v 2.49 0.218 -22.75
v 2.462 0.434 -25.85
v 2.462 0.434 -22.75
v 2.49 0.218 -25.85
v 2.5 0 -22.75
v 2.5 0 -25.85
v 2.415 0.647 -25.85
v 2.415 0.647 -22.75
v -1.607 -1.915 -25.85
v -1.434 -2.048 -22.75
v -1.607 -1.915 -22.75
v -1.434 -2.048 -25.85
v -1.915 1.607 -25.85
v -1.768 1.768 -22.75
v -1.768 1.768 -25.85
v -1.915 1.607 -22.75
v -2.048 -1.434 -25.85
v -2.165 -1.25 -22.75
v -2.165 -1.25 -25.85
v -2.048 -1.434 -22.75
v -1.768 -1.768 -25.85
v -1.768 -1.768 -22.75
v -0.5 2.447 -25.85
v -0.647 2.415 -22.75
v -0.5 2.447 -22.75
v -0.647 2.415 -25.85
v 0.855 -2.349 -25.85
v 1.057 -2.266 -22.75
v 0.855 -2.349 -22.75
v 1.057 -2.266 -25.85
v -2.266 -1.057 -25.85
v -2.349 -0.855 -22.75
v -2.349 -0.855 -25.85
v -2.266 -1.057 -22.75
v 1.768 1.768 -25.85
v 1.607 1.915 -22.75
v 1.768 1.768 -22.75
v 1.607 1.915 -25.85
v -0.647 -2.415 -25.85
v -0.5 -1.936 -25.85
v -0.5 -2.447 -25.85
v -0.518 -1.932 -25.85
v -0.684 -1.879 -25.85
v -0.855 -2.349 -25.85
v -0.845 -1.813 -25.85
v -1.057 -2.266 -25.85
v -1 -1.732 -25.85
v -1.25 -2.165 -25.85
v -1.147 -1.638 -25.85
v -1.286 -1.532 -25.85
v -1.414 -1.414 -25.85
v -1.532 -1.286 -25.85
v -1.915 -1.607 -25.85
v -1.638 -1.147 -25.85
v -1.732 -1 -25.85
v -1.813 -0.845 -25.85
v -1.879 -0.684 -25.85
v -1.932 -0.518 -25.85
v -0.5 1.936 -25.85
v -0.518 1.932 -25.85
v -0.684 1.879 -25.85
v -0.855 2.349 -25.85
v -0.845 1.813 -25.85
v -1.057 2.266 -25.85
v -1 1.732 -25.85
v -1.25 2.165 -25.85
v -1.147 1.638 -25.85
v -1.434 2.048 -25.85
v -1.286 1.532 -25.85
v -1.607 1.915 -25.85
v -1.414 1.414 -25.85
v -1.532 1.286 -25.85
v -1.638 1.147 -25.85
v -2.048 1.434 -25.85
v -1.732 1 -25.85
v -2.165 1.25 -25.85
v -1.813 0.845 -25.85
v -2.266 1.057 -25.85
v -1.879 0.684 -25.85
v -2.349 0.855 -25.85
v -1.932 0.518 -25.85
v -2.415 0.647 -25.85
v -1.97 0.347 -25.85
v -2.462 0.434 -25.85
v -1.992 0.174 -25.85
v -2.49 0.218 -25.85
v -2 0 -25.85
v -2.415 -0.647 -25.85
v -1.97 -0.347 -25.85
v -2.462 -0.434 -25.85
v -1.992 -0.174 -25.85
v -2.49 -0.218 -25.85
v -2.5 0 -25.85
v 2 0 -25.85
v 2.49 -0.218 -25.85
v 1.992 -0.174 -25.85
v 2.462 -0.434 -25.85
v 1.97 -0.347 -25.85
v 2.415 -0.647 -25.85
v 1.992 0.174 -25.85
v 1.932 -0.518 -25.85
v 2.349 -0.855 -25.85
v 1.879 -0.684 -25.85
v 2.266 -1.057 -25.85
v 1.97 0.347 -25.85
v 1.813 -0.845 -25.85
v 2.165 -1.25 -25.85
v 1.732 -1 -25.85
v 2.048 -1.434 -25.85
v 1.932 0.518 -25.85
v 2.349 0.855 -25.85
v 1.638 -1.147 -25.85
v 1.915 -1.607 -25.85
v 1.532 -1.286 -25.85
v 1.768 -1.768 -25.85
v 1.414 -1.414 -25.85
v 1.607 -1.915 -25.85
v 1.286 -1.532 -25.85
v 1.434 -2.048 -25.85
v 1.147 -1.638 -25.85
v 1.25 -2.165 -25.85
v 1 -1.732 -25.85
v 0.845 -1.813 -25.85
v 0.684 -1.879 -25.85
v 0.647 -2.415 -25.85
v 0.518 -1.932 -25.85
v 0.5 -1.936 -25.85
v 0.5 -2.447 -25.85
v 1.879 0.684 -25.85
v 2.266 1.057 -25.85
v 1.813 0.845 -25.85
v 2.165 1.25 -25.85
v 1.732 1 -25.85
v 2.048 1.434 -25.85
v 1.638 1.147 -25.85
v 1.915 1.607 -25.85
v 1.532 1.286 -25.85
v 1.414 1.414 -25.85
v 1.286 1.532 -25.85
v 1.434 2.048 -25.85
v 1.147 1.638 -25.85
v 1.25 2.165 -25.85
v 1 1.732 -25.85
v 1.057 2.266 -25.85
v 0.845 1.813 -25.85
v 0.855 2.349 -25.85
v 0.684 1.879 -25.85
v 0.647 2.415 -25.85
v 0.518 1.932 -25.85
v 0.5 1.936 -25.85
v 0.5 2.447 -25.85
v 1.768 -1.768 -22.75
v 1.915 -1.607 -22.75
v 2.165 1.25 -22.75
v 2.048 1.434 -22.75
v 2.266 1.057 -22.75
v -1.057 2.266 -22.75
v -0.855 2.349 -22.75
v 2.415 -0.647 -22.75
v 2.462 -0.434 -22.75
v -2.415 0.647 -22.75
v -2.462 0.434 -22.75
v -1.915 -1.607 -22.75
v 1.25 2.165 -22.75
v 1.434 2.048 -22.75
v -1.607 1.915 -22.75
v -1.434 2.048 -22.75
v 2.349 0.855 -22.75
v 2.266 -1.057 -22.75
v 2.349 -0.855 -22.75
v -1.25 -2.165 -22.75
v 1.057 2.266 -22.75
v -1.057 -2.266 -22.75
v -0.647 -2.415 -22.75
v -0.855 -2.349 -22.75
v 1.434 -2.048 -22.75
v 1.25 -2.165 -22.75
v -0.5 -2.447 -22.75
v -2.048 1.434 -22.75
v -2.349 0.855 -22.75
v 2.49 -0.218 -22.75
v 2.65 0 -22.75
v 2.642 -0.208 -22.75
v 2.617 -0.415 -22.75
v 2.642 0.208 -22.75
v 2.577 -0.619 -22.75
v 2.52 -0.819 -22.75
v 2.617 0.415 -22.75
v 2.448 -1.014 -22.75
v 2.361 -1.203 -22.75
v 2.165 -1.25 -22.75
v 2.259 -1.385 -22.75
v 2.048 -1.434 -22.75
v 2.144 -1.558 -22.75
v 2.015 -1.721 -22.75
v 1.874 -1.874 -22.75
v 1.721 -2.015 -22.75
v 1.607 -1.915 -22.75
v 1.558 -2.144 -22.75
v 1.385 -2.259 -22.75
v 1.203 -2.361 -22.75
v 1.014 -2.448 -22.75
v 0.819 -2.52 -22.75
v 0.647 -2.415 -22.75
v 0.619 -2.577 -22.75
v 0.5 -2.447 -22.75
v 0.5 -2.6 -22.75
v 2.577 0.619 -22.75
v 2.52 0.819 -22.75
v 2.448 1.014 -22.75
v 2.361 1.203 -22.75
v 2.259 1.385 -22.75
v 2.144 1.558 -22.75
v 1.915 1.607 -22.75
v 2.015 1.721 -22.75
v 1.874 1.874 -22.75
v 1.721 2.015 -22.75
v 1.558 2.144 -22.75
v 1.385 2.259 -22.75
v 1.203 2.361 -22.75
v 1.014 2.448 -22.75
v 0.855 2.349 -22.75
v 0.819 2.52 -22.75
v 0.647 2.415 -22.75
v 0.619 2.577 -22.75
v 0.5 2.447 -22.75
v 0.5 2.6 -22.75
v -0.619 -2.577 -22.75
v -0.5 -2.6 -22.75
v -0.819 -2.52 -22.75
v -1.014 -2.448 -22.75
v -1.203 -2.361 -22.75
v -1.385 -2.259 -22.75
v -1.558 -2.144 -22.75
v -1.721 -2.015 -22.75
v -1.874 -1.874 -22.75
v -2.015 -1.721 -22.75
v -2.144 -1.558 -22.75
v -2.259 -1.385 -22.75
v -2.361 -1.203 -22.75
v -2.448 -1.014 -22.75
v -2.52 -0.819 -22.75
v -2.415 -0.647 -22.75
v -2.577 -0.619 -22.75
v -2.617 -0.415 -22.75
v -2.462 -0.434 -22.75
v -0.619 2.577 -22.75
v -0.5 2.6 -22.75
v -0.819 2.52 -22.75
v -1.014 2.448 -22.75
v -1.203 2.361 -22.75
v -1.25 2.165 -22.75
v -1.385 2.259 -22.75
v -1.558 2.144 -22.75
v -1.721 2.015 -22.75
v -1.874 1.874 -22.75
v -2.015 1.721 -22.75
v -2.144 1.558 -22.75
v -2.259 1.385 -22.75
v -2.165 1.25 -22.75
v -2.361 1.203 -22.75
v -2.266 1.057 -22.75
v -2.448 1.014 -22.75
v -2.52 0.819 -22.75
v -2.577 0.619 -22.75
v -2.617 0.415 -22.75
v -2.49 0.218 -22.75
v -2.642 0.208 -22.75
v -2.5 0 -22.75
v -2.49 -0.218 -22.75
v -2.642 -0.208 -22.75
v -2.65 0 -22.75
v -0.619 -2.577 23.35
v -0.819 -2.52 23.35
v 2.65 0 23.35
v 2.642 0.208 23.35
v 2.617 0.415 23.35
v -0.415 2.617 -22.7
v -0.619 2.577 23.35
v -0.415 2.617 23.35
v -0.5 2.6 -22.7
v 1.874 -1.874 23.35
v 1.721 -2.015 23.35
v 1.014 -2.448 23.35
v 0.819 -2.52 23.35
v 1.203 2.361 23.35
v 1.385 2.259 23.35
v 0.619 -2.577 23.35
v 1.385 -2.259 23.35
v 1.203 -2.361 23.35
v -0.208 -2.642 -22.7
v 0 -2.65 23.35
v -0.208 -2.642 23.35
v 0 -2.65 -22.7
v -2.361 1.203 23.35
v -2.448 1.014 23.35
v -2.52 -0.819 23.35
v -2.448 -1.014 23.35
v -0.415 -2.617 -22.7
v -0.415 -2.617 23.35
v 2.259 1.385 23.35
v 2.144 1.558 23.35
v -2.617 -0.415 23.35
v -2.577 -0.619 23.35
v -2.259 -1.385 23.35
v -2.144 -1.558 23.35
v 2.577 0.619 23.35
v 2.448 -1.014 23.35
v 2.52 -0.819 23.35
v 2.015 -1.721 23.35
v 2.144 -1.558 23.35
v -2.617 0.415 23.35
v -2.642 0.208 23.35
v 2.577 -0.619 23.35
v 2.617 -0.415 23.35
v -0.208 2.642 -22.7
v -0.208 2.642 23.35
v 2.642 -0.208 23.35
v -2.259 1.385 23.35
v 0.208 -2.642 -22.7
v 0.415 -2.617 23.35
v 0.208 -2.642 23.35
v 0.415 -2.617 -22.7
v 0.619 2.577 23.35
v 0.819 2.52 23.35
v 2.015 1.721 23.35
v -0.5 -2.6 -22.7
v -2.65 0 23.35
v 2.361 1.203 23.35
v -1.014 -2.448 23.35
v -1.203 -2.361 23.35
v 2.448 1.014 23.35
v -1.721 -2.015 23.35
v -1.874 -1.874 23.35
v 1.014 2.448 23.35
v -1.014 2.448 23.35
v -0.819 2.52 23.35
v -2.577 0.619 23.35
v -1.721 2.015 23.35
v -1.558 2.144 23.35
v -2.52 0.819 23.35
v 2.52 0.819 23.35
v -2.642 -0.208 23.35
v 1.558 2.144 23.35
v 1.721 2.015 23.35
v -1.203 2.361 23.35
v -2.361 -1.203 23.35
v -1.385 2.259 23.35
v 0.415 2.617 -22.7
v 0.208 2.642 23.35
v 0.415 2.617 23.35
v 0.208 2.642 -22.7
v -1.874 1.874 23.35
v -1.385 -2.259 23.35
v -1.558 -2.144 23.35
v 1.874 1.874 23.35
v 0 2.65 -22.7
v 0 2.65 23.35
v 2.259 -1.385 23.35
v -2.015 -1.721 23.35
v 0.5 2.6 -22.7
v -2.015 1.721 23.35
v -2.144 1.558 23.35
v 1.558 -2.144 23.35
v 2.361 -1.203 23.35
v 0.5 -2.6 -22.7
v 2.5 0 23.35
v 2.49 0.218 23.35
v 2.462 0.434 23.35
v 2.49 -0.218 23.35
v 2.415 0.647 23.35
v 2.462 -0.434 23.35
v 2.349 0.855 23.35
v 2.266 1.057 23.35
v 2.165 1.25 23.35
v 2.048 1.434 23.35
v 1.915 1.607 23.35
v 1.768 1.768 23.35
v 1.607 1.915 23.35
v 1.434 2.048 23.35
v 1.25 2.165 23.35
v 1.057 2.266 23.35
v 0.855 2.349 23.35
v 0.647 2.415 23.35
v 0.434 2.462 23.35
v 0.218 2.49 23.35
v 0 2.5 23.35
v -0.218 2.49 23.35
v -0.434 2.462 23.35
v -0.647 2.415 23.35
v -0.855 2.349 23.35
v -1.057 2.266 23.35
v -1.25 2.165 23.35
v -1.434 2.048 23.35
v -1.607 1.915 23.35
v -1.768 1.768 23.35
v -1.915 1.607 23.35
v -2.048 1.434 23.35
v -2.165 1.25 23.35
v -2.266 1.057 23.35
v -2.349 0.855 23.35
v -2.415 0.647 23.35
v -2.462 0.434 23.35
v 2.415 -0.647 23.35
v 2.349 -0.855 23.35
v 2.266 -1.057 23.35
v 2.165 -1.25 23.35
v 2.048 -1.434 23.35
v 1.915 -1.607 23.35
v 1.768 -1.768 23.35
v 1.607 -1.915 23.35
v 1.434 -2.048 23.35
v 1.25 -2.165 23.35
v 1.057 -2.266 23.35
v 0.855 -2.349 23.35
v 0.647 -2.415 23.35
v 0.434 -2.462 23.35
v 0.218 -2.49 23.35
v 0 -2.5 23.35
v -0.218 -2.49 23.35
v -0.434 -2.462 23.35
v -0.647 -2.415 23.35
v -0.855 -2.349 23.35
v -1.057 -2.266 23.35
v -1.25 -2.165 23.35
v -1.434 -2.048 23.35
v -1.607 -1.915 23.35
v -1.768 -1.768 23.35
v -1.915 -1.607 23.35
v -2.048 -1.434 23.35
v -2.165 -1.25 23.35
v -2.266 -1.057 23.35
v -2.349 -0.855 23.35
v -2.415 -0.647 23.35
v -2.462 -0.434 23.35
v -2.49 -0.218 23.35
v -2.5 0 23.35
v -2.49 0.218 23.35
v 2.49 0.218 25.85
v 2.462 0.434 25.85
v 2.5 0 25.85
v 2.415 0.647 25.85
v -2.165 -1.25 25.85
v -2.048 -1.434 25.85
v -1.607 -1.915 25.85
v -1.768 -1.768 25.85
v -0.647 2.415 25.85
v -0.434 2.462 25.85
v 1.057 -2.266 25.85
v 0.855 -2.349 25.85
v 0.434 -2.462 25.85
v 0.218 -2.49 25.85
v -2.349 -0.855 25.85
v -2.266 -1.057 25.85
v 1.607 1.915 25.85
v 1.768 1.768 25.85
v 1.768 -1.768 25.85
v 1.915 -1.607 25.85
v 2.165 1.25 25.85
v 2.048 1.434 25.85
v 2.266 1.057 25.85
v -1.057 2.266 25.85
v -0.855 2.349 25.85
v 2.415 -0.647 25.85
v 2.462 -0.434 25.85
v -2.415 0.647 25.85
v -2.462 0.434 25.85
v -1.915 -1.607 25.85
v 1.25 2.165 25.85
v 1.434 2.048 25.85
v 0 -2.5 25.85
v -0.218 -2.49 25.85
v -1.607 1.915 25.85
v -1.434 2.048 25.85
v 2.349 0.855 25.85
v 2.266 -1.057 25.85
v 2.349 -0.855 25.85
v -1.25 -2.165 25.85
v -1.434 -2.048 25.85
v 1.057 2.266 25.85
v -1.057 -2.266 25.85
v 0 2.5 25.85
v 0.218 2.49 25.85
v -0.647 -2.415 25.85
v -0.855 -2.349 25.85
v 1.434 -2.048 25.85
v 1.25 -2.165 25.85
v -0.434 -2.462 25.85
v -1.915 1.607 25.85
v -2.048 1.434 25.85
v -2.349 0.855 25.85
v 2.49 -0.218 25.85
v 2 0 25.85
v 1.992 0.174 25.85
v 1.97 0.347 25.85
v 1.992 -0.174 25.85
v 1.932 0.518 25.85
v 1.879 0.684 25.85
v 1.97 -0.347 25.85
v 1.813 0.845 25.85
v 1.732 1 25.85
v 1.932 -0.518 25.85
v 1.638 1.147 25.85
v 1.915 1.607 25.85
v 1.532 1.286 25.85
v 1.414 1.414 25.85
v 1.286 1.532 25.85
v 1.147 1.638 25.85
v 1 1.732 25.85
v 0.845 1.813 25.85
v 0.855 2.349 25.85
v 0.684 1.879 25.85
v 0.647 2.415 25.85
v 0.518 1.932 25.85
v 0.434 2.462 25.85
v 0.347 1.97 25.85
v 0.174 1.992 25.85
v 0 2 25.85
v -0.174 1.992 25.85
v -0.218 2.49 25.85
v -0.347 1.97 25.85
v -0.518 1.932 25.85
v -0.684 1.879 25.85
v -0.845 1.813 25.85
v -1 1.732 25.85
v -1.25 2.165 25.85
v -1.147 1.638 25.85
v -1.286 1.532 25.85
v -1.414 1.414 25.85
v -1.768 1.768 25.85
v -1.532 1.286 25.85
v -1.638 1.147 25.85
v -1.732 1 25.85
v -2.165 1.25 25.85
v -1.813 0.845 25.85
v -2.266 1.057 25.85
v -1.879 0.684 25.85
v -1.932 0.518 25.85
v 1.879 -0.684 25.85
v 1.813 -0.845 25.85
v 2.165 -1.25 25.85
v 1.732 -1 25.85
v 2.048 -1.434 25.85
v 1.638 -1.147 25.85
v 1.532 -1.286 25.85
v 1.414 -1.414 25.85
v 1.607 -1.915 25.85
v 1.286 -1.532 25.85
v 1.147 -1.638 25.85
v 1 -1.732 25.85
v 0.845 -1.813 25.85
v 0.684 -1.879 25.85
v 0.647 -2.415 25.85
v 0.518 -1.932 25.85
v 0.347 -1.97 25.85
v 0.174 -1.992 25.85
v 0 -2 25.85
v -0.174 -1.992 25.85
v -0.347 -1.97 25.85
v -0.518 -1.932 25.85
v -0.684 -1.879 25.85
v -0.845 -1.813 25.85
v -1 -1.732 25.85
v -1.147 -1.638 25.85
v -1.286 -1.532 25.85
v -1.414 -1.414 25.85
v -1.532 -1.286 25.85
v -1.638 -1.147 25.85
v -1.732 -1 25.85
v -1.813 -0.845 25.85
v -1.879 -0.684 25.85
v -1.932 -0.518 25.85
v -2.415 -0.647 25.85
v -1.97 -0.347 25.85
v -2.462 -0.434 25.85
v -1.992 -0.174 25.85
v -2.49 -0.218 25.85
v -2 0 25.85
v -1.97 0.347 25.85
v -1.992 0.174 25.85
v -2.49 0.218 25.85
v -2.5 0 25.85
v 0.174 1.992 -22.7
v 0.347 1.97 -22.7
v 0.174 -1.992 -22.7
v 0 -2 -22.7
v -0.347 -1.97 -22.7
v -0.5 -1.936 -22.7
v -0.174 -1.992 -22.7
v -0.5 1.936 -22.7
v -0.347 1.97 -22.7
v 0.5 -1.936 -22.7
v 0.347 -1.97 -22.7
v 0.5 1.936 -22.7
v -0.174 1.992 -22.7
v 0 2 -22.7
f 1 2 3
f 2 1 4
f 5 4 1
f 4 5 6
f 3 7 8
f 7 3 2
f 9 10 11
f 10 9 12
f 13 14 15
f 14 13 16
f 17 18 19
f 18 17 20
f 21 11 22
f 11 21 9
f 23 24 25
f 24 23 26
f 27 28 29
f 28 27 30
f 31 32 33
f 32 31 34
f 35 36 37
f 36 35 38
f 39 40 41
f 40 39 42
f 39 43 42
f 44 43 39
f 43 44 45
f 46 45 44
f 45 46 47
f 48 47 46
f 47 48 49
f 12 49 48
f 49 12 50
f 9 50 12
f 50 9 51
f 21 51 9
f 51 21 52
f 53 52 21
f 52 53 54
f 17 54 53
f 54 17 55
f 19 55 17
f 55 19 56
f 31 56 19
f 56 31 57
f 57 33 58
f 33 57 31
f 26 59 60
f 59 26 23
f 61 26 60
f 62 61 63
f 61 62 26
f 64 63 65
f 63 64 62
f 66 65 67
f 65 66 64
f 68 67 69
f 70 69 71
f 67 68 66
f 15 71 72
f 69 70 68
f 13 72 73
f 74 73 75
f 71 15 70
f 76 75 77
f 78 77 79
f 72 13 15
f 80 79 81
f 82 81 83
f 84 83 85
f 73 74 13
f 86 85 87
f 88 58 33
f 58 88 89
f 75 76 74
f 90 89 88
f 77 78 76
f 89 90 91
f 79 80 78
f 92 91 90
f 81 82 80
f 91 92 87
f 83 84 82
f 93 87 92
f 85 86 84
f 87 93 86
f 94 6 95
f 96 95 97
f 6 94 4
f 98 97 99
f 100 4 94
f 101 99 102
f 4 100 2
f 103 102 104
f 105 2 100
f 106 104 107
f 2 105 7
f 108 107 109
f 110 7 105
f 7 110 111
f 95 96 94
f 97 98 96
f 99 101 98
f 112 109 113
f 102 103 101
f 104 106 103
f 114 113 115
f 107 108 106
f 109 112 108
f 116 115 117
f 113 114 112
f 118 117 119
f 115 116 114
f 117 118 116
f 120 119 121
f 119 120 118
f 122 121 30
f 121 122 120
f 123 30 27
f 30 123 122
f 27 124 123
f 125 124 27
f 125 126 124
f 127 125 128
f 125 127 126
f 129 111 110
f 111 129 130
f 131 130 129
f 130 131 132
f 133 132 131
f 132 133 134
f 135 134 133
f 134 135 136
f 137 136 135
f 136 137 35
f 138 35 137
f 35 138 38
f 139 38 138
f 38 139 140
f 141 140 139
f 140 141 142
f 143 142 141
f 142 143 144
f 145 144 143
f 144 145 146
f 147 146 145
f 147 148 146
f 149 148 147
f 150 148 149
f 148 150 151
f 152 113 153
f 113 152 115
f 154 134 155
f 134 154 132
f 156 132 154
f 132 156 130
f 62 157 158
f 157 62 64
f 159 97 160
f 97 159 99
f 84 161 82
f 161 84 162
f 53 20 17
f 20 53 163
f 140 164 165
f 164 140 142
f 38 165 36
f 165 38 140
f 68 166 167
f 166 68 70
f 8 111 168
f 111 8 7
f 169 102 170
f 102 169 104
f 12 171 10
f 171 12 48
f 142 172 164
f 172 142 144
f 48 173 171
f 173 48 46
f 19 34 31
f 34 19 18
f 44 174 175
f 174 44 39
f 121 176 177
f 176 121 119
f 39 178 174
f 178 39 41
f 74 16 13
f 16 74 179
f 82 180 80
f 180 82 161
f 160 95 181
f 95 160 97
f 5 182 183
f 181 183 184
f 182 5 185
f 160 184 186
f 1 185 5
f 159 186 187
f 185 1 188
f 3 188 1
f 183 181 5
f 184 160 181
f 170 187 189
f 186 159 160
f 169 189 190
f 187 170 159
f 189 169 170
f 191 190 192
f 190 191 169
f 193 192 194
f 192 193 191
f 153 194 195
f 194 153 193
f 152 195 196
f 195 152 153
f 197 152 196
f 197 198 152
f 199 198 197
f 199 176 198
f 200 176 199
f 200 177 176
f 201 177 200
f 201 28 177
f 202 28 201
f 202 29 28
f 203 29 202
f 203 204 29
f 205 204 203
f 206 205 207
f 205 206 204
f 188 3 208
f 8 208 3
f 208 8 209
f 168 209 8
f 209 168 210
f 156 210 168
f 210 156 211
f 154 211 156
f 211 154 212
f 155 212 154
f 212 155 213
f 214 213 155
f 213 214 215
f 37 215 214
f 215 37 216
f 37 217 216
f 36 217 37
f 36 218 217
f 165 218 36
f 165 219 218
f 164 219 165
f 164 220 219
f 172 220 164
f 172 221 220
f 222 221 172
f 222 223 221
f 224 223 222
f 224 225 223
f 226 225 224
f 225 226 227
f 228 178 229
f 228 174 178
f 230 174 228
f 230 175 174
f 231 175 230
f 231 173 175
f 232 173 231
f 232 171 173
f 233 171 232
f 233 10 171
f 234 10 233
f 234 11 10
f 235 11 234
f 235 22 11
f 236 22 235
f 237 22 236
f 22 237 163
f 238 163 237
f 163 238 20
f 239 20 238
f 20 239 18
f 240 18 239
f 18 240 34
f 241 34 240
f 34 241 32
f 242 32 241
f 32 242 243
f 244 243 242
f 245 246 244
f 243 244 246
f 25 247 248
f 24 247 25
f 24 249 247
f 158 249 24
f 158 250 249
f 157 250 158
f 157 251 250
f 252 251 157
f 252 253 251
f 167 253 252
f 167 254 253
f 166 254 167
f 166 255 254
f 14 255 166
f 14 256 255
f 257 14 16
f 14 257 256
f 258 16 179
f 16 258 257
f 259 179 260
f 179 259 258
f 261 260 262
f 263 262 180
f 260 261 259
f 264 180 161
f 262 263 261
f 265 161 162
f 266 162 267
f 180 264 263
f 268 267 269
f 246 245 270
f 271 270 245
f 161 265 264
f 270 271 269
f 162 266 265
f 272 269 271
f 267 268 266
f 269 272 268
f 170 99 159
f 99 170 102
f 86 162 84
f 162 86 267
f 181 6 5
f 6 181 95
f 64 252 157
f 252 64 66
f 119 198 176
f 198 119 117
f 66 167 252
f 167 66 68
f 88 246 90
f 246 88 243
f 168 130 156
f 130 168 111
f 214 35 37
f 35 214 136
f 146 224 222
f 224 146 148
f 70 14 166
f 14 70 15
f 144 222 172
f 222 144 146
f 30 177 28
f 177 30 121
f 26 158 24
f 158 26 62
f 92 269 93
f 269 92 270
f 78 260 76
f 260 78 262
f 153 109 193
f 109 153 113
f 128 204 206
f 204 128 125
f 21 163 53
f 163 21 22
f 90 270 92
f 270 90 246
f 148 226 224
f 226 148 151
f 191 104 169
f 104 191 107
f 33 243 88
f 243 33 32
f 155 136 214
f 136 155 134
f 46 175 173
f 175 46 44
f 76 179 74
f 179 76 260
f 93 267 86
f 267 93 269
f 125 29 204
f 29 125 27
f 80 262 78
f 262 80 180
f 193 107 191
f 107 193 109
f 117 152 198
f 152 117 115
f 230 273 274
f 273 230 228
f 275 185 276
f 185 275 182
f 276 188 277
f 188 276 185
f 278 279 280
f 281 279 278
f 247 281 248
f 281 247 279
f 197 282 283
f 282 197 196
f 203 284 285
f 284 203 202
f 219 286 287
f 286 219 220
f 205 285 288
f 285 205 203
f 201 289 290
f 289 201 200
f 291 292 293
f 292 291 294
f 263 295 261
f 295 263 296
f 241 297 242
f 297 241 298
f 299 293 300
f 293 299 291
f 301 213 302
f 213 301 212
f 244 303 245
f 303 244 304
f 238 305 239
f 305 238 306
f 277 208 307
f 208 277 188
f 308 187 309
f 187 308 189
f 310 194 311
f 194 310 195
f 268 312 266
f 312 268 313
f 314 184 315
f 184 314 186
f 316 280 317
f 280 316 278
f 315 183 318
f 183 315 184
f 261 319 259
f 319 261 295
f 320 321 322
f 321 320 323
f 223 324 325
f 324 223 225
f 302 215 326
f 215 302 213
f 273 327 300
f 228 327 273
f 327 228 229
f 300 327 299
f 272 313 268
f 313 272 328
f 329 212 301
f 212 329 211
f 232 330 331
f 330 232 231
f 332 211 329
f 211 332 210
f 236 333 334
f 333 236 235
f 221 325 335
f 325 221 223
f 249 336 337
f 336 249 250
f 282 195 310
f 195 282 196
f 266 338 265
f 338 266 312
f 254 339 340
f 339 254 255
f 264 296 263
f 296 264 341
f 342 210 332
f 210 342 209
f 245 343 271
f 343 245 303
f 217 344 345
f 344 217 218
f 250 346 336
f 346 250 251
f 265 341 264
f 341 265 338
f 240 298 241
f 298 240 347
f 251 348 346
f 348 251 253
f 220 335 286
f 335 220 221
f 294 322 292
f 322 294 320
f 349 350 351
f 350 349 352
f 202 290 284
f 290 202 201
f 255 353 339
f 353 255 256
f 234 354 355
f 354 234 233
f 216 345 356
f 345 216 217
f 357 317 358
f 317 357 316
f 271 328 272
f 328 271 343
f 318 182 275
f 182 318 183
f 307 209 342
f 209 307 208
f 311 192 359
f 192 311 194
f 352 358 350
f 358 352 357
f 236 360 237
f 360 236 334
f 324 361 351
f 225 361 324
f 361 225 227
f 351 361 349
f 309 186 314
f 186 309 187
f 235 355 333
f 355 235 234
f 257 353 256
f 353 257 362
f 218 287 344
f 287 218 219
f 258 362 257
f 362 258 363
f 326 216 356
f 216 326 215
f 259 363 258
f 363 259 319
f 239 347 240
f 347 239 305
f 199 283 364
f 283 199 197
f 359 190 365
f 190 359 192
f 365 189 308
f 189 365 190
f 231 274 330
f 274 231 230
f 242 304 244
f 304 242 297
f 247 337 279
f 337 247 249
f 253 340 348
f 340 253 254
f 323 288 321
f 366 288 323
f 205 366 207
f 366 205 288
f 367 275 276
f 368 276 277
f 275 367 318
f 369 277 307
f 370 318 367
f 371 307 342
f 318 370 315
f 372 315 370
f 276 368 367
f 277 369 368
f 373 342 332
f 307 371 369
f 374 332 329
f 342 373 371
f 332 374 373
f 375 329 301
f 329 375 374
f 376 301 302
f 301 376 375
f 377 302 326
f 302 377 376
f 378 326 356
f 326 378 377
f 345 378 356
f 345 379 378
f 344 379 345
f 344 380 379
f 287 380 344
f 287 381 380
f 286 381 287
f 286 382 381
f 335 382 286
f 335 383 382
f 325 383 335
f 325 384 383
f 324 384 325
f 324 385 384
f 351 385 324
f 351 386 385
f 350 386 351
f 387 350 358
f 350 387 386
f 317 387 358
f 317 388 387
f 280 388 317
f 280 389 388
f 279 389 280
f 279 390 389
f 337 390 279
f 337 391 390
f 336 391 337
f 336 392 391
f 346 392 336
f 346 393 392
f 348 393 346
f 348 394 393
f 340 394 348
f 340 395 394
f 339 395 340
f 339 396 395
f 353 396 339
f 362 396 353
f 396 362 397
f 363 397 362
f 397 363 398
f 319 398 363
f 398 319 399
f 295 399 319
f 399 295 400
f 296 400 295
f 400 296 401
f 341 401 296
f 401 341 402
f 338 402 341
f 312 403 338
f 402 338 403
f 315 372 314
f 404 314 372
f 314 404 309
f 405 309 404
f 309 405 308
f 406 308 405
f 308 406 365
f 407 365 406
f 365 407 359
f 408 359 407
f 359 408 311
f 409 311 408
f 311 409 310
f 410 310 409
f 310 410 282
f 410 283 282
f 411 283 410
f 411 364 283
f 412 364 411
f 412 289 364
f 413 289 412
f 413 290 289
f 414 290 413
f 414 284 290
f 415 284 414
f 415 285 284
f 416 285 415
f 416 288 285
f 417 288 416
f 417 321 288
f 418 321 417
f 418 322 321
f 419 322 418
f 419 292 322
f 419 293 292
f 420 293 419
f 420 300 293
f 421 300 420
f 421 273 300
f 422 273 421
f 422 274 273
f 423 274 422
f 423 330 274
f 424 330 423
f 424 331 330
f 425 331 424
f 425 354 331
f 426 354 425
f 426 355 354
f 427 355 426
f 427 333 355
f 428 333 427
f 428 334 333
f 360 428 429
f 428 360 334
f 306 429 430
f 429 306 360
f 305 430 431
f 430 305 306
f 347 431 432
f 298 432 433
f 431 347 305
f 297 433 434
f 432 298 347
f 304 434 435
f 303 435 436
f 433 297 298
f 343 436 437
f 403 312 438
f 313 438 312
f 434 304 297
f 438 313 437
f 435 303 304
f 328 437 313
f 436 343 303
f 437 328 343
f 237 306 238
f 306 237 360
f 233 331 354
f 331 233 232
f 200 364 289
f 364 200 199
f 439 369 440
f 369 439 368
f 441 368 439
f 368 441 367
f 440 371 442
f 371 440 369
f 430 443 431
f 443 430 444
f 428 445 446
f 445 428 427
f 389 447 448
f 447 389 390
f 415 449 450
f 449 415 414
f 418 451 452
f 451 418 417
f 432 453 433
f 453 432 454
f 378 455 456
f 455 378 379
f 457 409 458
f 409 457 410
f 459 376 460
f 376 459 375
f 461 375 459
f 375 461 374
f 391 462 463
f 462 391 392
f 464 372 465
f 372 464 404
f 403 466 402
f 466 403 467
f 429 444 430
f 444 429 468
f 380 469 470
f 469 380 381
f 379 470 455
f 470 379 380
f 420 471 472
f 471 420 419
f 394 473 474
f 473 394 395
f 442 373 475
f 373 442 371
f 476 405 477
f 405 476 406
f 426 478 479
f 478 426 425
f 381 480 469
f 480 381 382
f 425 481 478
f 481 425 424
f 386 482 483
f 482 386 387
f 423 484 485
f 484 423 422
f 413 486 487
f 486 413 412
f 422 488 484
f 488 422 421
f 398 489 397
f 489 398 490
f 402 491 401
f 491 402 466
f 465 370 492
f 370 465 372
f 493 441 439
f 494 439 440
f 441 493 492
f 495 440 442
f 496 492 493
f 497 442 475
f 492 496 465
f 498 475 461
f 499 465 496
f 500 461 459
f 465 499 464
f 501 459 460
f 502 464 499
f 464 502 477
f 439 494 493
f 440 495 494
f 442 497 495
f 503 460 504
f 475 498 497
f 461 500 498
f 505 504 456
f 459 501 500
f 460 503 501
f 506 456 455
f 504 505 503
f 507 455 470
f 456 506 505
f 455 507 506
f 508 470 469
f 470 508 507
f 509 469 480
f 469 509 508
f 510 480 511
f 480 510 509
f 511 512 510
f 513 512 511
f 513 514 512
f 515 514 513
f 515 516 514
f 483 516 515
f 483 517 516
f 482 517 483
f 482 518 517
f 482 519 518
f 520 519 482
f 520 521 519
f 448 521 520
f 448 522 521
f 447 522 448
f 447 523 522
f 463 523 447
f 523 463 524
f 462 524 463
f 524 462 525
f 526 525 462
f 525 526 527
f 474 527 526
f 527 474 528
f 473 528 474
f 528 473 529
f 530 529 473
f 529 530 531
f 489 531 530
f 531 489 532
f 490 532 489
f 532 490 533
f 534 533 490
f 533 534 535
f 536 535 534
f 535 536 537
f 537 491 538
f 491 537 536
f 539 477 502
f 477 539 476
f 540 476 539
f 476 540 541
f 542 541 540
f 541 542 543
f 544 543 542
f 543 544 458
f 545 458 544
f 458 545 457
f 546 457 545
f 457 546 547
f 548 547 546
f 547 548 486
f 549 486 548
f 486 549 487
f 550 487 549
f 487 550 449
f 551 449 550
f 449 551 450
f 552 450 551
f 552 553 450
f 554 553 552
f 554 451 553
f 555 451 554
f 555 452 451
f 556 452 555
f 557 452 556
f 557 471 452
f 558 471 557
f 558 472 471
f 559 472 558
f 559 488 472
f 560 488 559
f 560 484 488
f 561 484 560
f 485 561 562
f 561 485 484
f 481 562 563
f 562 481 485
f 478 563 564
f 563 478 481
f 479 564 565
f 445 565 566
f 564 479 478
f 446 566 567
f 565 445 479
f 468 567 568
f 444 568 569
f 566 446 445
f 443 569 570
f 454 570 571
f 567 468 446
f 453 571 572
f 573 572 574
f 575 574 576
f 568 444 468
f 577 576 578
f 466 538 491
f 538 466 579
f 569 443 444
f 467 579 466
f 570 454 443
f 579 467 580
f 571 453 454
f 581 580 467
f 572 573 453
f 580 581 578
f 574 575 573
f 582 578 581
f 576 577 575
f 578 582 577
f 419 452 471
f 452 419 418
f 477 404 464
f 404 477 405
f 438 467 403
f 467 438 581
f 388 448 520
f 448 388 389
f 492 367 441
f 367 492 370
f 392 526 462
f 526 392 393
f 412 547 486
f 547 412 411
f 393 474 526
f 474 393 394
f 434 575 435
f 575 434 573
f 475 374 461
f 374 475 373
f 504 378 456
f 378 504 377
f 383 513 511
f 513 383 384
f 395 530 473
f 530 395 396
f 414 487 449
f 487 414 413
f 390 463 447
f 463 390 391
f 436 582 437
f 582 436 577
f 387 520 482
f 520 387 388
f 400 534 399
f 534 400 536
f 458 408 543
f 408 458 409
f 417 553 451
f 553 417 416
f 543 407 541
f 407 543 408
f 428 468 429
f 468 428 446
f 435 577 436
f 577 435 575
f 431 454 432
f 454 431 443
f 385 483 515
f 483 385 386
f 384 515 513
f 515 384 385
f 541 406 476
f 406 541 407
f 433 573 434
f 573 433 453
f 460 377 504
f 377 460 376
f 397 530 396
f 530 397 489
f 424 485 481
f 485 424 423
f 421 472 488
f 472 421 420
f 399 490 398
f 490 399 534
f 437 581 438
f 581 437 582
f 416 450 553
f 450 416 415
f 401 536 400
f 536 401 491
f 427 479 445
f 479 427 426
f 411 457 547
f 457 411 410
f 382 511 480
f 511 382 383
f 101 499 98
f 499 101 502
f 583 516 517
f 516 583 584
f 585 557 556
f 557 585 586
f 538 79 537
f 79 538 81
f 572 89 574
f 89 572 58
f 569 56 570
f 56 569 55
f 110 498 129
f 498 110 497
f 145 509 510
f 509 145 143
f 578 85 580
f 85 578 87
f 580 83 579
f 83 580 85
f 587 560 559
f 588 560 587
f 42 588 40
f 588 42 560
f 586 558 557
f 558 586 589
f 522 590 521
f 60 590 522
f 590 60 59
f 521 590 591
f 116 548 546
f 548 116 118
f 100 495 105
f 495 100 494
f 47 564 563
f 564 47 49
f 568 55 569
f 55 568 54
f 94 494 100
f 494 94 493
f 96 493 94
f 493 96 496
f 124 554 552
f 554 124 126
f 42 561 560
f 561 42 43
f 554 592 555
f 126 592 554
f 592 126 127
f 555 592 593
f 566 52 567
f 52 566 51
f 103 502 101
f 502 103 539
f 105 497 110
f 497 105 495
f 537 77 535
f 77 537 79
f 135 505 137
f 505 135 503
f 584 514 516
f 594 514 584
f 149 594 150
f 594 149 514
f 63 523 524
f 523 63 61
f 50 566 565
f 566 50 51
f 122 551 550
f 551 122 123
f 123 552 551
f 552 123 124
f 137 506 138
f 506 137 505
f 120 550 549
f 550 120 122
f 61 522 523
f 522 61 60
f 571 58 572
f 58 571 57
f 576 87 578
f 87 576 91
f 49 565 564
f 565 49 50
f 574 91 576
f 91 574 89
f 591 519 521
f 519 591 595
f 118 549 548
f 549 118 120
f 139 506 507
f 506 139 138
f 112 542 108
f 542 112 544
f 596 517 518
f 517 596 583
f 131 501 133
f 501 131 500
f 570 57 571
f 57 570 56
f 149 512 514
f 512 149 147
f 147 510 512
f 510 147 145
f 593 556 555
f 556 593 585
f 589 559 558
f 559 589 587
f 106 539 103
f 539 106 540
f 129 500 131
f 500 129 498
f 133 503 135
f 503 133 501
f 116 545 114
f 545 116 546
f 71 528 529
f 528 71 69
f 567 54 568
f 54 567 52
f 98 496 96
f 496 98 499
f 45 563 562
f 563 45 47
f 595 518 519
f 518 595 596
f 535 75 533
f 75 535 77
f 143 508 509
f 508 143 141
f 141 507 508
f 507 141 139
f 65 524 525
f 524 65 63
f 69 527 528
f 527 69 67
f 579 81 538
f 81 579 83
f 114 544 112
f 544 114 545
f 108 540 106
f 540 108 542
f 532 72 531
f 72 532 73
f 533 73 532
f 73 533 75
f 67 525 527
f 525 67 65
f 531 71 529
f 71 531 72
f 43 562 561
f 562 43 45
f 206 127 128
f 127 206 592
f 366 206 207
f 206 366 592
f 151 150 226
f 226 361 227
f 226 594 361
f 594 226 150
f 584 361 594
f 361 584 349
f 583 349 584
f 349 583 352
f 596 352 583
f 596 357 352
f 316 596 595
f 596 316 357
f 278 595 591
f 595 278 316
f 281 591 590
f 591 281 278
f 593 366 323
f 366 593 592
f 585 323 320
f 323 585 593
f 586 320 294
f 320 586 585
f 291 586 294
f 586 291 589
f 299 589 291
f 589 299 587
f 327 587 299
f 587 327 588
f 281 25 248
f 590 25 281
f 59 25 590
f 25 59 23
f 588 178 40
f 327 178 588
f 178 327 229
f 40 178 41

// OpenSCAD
// part_id: sun17
// name: Sun slotted shaft
// source_drawing_ids: DRW-021
// units: mm
// revision: 0.1
// SPDX-License-Identifier: MIT

module part_sun17(
    outer_d = 5.30,
    inner_d = 4.0,
    top_d = 5.0,
    top_h = 2.5,
    body_h = 49.2,
    tip_d = 5.0,
    split_h = 3.1,
    split_w = 1.0
) {
    total_h = body_h + top_h;
    main_body_h = body_h - split_h;

    translate([0, 0, -total_h / 2]) difference() {
        union() {
            cylinder(d = tip_d, h = split_h, center = false, $fn = 72);
            translate([0, 0, split_h])
                cylinder(d = outer_d, h = main_body_h, center = false, $fn = 80);
            translate([0, 0, body_h])
                cylinder(d = top_d, h = top_h, center = false, $fn = 72);
        }

        translate([0, 0, -0.05])
            cylinder(d = inner_d, h = total_h + 0.1, center = false, $fn = 72);

        // Split the lower end to create the spring collet shown on sheet 8.
        translate([-split_w / 2, -tip_d, -0.05])
            cube([split_w, tip_d * 2, split_h + 0.1], center = false);
    }
}

// ---- "main guard" ----
if (is_undef(__LIB_MODE__)) {
    part_sun17();
}
